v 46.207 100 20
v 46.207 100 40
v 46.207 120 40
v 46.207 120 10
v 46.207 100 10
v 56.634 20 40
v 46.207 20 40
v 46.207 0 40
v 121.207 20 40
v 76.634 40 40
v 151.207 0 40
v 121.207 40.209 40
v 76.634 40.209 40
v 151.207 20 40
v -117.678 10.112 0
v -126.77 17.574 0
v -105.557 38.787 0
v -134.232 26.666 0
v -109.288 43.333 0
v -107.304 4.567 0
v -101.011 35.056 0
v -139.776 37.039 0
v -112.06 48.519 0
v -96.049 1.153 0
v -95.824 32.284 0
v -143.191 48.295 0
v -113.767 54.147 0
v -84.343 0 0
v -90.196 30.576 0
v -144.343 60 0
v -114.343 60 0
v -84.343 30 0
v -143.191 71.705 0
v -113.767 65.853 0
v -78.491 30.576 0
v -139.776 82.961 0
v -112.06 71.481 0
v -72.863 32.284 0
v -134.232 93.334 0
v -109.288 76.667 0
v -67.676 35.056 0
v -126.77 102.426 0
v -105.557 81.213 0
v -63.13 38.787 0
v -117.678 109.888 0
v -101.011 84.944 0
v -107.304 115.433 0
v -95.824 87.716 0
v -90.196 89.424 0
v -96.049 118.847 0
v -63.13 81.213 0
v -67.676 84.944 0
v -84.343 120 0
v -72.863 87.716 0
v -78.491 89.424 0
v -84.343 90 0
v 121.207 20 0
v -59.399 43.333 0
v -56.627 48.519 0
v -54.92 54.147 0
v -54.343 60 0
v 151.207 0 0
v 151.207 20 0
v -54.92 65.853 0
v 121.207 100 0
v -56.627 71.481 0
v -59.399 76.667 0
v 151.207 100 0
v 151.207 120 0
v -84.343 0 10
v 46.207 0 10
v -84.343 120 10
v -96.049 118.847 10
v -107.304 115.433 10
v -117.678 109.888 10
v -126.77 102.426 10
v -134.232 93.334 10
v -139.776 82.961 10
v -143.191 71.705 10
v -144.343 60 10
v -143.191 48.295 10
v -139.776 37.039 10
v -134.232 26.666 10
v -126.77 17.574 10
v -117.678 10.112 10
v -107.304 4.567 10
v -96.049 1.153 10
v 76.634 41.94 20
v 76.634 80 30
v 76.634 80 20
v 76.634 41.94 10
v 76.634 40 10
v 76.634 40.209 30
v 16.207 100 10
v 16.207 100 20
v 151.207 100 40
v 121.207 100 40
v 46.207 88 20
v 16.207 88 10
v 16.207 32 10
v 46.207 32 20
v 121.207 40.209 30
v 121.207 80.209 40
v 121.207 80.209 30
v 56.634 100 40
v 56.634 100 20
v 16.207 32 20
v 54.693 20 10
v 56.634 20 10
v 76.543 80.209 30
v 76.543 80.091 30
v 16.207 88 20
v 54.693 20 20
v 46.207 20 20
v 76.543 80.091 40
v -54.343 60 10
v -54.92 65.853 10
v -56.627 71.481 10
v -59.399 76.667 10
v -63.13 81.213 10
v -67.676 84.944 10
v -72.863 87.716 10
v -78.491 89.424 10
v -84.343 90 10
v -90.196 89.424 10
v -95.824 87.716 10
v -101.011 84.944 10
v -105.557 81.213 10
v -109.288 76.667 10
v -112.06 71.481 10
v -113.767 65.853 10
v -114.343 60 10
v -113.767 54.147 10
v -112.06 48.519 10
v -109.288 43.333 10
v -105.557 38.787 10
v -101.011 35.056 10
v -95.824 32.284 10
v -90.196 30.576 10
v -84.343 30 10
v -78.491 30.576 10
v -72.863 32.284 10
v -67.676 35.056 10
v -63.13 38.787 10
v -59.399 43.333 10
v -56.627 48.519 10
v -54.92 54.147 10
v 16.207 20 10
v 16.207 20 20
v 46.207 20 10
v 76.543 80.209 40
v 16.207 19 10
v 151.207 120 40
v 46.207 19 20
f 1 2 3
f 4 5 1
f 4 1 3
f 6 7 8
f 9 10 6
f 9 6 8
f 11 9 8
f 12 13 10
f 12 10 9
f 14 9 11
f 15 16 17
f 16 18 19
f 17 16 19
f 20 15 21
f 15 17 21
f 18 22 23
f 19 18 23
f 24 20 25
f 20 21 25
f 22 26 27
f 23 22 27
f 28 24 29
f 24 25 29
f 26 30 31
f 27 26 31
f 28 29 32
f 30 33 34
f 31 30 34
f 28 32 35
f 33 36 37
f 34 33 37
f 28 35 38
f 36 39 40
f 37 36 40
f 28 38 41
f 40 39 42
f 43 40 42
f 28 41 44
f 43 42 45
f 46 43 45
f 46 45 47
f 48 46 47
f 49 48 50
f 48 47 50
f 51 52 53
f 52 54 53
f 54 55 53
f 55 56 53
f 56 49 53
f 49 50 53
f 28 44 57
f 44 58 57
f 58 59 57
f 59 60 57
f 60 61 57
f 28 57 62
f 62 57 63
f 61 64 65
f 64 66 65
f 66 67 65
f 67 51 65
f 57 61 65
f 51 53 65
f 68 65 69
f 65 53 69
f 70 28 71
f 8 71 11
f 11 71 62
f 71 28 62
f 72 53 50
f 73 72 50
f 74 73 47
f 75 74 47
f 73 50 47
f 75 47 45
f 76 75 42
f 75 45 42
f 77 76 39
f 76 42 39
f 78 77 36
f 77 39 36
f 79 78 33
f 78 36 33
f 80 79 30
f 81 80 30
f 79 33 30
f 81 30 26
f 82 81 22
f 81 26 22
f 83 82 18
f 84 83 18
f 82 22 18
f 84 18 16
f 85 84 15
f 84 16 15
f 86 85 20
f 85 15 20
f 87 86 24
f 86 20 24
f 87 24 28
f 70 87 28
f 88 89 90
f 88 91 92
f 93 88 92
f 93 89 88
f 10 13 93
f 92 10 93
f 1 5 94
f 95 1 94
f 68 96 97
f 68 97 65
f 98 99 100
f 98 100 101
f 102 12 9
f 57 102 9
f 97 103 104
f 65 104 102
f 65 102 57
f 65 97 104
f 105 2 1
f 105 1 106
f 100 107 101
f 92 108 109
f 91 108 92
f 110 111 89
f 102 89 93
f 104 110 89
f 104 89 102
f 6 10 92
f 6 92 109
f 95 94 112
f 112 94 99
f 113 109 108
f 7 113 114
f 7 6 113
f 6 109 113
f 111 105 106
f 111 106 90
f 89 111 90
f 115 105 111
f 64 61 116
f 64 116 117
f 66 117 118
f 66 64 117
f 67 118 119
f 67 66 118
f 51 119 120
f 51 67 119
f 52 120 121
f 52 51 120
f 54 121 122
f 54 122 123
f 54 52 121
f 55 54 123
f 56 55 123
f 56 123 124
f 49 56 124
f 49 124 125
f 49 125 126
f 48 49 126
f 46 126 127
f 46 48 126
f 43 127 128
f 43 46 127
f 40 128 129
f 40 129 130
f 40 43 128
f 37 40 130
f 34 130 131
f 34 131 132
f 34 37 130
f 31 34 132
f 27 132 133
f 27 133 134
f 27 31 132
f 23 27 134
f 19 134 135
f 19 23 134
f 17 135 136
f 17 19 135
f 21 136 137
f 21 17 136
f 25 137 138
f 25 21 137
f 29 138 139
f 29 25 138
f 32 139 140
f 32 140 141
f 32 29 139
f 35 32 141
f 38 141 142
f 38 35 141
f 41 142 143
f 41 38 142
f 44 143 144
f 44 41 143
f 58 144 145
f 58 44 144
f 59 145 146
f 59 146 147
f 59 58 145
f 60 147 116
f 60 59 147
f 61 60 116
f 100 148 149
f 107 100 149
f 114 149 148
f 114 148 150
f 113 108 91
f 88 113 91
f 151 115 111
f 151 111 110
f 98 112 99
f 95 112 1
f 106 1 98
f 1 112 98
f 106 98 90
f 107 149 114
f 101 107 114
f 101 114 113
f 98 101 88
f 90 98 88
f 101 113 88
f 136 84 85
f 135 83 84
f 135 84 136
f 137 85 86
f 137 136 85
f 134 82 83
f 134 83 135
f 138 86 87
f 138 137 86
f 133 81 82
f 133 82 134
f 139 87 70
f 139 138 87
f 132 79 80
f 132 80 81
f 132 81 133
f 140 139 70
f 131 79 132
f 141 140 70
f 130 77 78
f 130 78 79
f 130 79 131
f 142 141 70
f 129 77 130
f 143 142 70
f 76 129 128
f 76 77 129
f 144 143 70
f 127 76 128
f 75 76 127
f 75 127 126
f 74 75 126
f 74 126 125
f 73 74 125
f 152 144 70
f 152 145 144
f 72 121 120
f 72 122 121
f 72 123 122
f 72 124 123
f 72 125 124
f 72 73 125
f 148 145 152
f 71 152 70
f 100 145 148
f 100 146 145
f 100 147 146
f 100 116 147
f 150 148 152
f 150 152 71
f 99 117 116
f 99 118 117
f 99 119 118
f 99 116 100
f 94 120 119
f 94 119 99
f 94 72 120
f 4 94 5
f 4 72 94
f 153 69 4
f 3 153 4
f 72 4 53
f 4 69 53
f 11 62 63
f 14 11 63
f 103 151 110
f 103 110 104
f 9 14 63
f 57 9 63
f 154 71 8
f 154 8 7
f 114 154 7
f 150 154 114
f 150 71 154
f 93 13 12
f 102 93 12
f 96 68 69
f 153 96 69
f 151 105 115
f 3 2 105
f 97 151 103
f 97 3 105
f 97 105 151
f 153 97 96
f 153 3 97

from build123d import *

# Parameters (mm, degrees)
SKETCH2_R               = 30
BOSS_EXTRUDE2_DEPTH     = 10
SKETCH4_W               = 39.74410588
SKETCH4_H               = 80
CUT_EXTRUDE1_DEPTH      = 30
SKETCH5_W               = 105
SKETCH5_H               = 120
BOSS_EXTRUDE3_DEPTH     = 40
SKETCH6_W               = 78.106224714
SKETCH6_H               = 80
CUT_EXTRUDE2_DEPTH      = 30
SKETCH7_W               = 45
SKETCH7_H               = 40
CUT_EXTRUDE3_DEPTH      = 10
CUT_EXTRUDE4_DEPTH      = 30
BOSS_EXTRUDE4_DEPTH     = 10
CUT_EXTRUDE5_DEPTH      = 1
CUT_EXTRUDE5_DEPTH_BACK = 68
SKETCH11_W              = 30
SKETCH11_H              = 10
BOSS_EXTRUDE8_DEPTH     = 12


with BuildPart() as part:
    # Sketch2 → Boss-Extrude2 (new body)
    with BuildSketch(Plane.XY):
        with BuildLine():
            Line((46.207044142, 120), (-84.343419201, 120))
            ThreePointArc((-84.343419201, 120), (-144.343419201, 60), (-84.343419201, 0))
            Line((-84.343419201, 0), (0, 0))
            Line((0, 0), (151.207044142, 0))
            Line((151.207044142, 0), (151.207044142, 120))
            Line((151.207044142, 120), (46.207044142, 120))
        make_face()
        with Locations((-84.343419201, 60)):
            Circle(SKETCH2_R, mode=Mode.SUBTRACT)
    extrude(amount=BOSS_EXTRUDE2_DEPTH)

    # Sketch4 → Cut-Extrude1 (cut)
    with BuildSketch(Plane(origin=(151.207044142, 0, 0), x_dir=(0, 0, -1), z_dir=(1, 0, 0))):
        with Locations((-1.423296347, 60)):
            Rectangle(SKETCH4_W, SKETCH4_H)
    extrude(amount=-CUT_EXTRUDE1_DEPTH, mode=Mode.SUBTRACT)

    # Sketch5 → Boss-Extrude3 (add)
    with BuildSketch(Plane.XY):
        with Locations((98.707044142, 60)):
            Rectangle(SKETCH5_W, SKETCH5_H)
    extrude(amount=BOSS_EXTRUDE3_DEPTH)

    # Sketch6 → Cut-Extrude2 (cut)
    with BuildSketch(Plane(origin=(151.207044142, 0, 0), x_dir=(0, 0, -1), z_dir=(1, 0, 0))):
        with Locations((-16.932746975, 60)):
            Rectangle(SKETCH6_W, SKETCH6_H)
    extrude(amount=-CUT_EXTRUDE2_DEPTH, mode=Mode.SUBTRACT)

    # Sketch7 → Cut-Extrude3 (cut)
    with BuildSketch(Plane.XY.offset(40)):
        with Locations((99.042729198, 60.209092216)):
            Rectangle(SKETCH7_W, SKETCH7_H)
    extrude(amount=-CUT_EXTRUDE3_DEPTH, mode=Mode.SUBTRACT)

    # Sketch8 → Cut-Extrude4 (cut)
    with BuildSketch(Plane.XY.offset(40)):
        Polygon((19.599086243, 100), (56.633635385, 100), (76.633635385, 80), (76.633635385, 40), (56.633635385, 20), (19.599086243, 20), align=None)
    extrude(amount=-CUT_EXTRUDE4_DEPTH, mode=Mode.SUBTRACT)

    # Sketch9 → Boss-Extrude4 (add)
    with BuildSketch(Plane.XY.offset(10)):
        Polygon((46.207044142, 100), (16.207044142, 100), (16.207044142, 20), (46.207044142, 20), (54.69343027, 20), (76.633635385, 41.940205115), (76.633635385, 80), (56.633635385, 100), align=None)
    extrude(amount=BOSS_EXTRUDE4_DEPTH)

    # Sketch10 → Cut-Extrude5 (cut, two sides: drawn at the far end of the back side and taken through both)
    with BuildSketch(Plane.XZ.offset(-20).offset(-CUT_EXTRUDE5_DEPTH_BACK)):
        Polygon((16.207044142, 10), (46.207044142, 20), (16.207044142, 20), align=None)
    extrude(amount=CUT_EXTRUDE5_DEPTH + CUT_EXTRUDE5_DEPTH_BACK, mode=Mode.SUBTRACT)

    # Sketch11 → Boss-Extrude8 (add)
    with BuildSketch(Plane.XZ.offset(-20)):
        with Locations((31.207044142, 15)):
            Rectangle(SKETCH11_W, SKETCH11_H)
    extrude(amount=-BOSS_EXTRUDE8_DEPTH)


solid = part.part
